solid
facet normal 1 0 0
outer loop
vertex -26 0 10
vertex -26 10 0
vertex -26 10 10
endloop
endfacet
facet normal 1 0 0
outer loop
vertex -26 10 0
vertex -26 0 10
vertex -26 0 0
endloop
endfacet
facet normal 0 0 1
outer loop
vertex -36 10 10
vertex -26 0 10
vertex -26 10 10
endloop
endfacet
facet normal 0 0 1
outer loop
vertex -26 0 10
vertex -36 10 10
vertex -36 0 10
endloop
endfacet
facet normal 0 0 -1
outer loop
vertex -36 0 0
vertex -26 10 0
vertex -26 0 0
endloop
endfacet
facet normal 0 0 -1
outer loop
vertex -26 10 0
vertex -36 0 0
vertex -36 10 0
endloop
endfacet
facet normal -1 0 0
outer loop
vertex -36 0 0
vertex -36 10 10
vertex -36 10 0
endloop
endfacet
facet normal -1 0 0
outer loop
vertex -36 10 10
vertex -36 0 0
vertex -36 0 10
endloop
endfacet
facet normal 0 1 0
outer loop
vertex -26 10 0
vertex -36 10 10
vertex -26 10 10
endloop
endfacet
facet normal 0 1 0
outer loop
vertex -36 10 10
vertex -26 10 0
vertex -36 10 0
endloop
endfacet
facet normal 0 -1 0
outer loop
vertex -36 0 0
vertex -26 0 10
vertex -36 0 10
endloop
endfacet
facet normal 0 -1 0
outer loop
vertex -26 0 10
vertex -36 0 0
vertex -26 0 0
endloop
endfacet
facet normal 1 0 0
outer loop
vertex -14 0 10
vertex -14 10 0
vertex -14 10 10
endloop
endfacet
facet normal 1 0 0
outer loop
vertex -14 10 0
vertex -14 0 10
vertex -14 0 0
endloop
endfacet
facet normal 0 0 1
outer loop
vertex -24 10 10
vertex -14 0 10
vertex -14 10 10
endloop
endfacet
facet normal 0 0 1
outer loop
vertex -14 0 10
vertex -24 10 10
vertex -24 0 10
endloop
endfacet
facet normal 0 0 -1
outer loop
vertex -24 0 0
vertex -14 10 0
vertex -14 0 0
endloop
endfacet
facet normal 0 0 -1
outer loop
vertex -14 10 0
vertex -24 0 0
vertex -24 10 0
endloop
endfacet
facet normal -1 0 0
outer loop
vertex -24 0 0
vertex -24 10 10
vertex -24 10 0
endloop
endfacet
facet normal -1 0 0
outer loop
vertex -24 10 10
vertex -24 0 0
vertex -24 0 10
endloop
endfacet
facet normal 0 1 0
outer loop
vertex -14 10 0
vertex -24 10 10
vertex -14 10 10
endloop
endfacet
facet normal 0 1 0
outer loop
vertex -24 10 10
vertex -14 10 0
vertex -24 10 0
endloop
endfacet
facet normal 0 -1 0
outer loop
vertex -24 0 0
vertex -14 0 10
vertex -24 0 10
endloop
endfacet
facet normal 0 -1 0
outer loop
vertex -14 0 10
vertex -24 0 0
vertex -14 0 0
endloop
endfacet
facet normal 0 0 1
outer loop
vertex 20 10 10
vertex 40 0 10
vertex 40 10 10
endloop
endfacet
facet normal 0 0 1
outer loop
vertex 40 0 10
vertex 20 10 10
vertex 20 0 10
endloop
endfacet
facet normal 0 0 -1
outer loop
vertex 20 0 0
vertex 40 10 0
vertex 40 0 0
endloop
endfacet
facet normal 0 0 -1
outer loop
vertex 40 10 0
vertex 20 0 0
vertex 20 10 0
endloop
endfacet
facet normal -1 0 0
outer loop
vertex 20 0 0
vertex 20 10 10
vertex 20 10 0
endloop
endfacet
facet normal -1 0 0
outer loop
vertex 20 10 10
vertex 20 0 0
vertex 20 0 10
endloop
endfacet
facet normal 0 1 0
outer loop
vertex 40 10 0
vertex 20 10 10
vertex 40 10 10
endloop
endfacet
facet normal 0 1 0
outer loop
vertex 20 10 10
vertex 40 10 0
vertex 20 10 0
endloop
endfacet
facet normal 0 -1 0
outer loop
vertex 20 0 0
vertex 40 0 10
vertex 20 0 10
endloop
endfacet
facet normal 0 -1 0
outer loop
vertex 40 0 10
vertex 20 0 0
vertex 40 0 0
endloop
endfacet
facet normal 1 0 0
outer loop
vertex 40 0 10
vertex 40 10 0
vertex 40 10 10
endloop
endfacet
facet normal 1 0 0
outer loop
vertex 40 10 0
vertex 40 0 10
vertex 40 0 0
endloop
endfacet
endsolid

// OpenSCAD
// file: fixtures.scad
// Fusecheck-gate fixture (scripts/fusecheck-check.sh --selftest, issue #627):
// a tiny two-pose design the fixture manifests gate. Each pose is one way a
// body count can land, and the manifests pin the verdict each must produce:
//   separable   two cubes with a 2 mm gap — two separable bodies (the count
//               every passing assert row expects)
//   fused       two cubes sharing a full face — one connected body over the
//               face-adjacency graph (the count the WARN row cannot meet and
//               the mandatory control must stay at)
//   assembled   both poses side by side, the ungated default render
// Units: mm. Plain cubes on purpose — the selftest renders it, nobody prints
// it, and the body count must stay 2 / 1 at any curve quality.
part = "assembled";     // which pose to render (see the header)

module separable() {
    translate([-6, 0, 0]) cube([10, 10, 10]);
    translate([+6, 0, 0]) cube([10, 10, 10]);
}

module fused() {
    translate([-10, 0, 0]) cube([10, 10, 10]);
    cube([10, 10, 10]);
}

module assembled() {
    translate([-30, 0, 0]) separable();
    translate([+30, 0, 0]) fused();
}

if (part == "separable") separable();
else if (part == "fused") fused();
else assembled();
// file: closure-mid.scad
// One hop toward fixtures.scad (issue #766 transitive closure).
include <fixtures.scad>
// main file
// Two-hop include of fixtures.scad — the variable-only-derivative shape
// (issue #766): this file has no `part ==` dispatcher of its own.
include <closure-mid.scad>
